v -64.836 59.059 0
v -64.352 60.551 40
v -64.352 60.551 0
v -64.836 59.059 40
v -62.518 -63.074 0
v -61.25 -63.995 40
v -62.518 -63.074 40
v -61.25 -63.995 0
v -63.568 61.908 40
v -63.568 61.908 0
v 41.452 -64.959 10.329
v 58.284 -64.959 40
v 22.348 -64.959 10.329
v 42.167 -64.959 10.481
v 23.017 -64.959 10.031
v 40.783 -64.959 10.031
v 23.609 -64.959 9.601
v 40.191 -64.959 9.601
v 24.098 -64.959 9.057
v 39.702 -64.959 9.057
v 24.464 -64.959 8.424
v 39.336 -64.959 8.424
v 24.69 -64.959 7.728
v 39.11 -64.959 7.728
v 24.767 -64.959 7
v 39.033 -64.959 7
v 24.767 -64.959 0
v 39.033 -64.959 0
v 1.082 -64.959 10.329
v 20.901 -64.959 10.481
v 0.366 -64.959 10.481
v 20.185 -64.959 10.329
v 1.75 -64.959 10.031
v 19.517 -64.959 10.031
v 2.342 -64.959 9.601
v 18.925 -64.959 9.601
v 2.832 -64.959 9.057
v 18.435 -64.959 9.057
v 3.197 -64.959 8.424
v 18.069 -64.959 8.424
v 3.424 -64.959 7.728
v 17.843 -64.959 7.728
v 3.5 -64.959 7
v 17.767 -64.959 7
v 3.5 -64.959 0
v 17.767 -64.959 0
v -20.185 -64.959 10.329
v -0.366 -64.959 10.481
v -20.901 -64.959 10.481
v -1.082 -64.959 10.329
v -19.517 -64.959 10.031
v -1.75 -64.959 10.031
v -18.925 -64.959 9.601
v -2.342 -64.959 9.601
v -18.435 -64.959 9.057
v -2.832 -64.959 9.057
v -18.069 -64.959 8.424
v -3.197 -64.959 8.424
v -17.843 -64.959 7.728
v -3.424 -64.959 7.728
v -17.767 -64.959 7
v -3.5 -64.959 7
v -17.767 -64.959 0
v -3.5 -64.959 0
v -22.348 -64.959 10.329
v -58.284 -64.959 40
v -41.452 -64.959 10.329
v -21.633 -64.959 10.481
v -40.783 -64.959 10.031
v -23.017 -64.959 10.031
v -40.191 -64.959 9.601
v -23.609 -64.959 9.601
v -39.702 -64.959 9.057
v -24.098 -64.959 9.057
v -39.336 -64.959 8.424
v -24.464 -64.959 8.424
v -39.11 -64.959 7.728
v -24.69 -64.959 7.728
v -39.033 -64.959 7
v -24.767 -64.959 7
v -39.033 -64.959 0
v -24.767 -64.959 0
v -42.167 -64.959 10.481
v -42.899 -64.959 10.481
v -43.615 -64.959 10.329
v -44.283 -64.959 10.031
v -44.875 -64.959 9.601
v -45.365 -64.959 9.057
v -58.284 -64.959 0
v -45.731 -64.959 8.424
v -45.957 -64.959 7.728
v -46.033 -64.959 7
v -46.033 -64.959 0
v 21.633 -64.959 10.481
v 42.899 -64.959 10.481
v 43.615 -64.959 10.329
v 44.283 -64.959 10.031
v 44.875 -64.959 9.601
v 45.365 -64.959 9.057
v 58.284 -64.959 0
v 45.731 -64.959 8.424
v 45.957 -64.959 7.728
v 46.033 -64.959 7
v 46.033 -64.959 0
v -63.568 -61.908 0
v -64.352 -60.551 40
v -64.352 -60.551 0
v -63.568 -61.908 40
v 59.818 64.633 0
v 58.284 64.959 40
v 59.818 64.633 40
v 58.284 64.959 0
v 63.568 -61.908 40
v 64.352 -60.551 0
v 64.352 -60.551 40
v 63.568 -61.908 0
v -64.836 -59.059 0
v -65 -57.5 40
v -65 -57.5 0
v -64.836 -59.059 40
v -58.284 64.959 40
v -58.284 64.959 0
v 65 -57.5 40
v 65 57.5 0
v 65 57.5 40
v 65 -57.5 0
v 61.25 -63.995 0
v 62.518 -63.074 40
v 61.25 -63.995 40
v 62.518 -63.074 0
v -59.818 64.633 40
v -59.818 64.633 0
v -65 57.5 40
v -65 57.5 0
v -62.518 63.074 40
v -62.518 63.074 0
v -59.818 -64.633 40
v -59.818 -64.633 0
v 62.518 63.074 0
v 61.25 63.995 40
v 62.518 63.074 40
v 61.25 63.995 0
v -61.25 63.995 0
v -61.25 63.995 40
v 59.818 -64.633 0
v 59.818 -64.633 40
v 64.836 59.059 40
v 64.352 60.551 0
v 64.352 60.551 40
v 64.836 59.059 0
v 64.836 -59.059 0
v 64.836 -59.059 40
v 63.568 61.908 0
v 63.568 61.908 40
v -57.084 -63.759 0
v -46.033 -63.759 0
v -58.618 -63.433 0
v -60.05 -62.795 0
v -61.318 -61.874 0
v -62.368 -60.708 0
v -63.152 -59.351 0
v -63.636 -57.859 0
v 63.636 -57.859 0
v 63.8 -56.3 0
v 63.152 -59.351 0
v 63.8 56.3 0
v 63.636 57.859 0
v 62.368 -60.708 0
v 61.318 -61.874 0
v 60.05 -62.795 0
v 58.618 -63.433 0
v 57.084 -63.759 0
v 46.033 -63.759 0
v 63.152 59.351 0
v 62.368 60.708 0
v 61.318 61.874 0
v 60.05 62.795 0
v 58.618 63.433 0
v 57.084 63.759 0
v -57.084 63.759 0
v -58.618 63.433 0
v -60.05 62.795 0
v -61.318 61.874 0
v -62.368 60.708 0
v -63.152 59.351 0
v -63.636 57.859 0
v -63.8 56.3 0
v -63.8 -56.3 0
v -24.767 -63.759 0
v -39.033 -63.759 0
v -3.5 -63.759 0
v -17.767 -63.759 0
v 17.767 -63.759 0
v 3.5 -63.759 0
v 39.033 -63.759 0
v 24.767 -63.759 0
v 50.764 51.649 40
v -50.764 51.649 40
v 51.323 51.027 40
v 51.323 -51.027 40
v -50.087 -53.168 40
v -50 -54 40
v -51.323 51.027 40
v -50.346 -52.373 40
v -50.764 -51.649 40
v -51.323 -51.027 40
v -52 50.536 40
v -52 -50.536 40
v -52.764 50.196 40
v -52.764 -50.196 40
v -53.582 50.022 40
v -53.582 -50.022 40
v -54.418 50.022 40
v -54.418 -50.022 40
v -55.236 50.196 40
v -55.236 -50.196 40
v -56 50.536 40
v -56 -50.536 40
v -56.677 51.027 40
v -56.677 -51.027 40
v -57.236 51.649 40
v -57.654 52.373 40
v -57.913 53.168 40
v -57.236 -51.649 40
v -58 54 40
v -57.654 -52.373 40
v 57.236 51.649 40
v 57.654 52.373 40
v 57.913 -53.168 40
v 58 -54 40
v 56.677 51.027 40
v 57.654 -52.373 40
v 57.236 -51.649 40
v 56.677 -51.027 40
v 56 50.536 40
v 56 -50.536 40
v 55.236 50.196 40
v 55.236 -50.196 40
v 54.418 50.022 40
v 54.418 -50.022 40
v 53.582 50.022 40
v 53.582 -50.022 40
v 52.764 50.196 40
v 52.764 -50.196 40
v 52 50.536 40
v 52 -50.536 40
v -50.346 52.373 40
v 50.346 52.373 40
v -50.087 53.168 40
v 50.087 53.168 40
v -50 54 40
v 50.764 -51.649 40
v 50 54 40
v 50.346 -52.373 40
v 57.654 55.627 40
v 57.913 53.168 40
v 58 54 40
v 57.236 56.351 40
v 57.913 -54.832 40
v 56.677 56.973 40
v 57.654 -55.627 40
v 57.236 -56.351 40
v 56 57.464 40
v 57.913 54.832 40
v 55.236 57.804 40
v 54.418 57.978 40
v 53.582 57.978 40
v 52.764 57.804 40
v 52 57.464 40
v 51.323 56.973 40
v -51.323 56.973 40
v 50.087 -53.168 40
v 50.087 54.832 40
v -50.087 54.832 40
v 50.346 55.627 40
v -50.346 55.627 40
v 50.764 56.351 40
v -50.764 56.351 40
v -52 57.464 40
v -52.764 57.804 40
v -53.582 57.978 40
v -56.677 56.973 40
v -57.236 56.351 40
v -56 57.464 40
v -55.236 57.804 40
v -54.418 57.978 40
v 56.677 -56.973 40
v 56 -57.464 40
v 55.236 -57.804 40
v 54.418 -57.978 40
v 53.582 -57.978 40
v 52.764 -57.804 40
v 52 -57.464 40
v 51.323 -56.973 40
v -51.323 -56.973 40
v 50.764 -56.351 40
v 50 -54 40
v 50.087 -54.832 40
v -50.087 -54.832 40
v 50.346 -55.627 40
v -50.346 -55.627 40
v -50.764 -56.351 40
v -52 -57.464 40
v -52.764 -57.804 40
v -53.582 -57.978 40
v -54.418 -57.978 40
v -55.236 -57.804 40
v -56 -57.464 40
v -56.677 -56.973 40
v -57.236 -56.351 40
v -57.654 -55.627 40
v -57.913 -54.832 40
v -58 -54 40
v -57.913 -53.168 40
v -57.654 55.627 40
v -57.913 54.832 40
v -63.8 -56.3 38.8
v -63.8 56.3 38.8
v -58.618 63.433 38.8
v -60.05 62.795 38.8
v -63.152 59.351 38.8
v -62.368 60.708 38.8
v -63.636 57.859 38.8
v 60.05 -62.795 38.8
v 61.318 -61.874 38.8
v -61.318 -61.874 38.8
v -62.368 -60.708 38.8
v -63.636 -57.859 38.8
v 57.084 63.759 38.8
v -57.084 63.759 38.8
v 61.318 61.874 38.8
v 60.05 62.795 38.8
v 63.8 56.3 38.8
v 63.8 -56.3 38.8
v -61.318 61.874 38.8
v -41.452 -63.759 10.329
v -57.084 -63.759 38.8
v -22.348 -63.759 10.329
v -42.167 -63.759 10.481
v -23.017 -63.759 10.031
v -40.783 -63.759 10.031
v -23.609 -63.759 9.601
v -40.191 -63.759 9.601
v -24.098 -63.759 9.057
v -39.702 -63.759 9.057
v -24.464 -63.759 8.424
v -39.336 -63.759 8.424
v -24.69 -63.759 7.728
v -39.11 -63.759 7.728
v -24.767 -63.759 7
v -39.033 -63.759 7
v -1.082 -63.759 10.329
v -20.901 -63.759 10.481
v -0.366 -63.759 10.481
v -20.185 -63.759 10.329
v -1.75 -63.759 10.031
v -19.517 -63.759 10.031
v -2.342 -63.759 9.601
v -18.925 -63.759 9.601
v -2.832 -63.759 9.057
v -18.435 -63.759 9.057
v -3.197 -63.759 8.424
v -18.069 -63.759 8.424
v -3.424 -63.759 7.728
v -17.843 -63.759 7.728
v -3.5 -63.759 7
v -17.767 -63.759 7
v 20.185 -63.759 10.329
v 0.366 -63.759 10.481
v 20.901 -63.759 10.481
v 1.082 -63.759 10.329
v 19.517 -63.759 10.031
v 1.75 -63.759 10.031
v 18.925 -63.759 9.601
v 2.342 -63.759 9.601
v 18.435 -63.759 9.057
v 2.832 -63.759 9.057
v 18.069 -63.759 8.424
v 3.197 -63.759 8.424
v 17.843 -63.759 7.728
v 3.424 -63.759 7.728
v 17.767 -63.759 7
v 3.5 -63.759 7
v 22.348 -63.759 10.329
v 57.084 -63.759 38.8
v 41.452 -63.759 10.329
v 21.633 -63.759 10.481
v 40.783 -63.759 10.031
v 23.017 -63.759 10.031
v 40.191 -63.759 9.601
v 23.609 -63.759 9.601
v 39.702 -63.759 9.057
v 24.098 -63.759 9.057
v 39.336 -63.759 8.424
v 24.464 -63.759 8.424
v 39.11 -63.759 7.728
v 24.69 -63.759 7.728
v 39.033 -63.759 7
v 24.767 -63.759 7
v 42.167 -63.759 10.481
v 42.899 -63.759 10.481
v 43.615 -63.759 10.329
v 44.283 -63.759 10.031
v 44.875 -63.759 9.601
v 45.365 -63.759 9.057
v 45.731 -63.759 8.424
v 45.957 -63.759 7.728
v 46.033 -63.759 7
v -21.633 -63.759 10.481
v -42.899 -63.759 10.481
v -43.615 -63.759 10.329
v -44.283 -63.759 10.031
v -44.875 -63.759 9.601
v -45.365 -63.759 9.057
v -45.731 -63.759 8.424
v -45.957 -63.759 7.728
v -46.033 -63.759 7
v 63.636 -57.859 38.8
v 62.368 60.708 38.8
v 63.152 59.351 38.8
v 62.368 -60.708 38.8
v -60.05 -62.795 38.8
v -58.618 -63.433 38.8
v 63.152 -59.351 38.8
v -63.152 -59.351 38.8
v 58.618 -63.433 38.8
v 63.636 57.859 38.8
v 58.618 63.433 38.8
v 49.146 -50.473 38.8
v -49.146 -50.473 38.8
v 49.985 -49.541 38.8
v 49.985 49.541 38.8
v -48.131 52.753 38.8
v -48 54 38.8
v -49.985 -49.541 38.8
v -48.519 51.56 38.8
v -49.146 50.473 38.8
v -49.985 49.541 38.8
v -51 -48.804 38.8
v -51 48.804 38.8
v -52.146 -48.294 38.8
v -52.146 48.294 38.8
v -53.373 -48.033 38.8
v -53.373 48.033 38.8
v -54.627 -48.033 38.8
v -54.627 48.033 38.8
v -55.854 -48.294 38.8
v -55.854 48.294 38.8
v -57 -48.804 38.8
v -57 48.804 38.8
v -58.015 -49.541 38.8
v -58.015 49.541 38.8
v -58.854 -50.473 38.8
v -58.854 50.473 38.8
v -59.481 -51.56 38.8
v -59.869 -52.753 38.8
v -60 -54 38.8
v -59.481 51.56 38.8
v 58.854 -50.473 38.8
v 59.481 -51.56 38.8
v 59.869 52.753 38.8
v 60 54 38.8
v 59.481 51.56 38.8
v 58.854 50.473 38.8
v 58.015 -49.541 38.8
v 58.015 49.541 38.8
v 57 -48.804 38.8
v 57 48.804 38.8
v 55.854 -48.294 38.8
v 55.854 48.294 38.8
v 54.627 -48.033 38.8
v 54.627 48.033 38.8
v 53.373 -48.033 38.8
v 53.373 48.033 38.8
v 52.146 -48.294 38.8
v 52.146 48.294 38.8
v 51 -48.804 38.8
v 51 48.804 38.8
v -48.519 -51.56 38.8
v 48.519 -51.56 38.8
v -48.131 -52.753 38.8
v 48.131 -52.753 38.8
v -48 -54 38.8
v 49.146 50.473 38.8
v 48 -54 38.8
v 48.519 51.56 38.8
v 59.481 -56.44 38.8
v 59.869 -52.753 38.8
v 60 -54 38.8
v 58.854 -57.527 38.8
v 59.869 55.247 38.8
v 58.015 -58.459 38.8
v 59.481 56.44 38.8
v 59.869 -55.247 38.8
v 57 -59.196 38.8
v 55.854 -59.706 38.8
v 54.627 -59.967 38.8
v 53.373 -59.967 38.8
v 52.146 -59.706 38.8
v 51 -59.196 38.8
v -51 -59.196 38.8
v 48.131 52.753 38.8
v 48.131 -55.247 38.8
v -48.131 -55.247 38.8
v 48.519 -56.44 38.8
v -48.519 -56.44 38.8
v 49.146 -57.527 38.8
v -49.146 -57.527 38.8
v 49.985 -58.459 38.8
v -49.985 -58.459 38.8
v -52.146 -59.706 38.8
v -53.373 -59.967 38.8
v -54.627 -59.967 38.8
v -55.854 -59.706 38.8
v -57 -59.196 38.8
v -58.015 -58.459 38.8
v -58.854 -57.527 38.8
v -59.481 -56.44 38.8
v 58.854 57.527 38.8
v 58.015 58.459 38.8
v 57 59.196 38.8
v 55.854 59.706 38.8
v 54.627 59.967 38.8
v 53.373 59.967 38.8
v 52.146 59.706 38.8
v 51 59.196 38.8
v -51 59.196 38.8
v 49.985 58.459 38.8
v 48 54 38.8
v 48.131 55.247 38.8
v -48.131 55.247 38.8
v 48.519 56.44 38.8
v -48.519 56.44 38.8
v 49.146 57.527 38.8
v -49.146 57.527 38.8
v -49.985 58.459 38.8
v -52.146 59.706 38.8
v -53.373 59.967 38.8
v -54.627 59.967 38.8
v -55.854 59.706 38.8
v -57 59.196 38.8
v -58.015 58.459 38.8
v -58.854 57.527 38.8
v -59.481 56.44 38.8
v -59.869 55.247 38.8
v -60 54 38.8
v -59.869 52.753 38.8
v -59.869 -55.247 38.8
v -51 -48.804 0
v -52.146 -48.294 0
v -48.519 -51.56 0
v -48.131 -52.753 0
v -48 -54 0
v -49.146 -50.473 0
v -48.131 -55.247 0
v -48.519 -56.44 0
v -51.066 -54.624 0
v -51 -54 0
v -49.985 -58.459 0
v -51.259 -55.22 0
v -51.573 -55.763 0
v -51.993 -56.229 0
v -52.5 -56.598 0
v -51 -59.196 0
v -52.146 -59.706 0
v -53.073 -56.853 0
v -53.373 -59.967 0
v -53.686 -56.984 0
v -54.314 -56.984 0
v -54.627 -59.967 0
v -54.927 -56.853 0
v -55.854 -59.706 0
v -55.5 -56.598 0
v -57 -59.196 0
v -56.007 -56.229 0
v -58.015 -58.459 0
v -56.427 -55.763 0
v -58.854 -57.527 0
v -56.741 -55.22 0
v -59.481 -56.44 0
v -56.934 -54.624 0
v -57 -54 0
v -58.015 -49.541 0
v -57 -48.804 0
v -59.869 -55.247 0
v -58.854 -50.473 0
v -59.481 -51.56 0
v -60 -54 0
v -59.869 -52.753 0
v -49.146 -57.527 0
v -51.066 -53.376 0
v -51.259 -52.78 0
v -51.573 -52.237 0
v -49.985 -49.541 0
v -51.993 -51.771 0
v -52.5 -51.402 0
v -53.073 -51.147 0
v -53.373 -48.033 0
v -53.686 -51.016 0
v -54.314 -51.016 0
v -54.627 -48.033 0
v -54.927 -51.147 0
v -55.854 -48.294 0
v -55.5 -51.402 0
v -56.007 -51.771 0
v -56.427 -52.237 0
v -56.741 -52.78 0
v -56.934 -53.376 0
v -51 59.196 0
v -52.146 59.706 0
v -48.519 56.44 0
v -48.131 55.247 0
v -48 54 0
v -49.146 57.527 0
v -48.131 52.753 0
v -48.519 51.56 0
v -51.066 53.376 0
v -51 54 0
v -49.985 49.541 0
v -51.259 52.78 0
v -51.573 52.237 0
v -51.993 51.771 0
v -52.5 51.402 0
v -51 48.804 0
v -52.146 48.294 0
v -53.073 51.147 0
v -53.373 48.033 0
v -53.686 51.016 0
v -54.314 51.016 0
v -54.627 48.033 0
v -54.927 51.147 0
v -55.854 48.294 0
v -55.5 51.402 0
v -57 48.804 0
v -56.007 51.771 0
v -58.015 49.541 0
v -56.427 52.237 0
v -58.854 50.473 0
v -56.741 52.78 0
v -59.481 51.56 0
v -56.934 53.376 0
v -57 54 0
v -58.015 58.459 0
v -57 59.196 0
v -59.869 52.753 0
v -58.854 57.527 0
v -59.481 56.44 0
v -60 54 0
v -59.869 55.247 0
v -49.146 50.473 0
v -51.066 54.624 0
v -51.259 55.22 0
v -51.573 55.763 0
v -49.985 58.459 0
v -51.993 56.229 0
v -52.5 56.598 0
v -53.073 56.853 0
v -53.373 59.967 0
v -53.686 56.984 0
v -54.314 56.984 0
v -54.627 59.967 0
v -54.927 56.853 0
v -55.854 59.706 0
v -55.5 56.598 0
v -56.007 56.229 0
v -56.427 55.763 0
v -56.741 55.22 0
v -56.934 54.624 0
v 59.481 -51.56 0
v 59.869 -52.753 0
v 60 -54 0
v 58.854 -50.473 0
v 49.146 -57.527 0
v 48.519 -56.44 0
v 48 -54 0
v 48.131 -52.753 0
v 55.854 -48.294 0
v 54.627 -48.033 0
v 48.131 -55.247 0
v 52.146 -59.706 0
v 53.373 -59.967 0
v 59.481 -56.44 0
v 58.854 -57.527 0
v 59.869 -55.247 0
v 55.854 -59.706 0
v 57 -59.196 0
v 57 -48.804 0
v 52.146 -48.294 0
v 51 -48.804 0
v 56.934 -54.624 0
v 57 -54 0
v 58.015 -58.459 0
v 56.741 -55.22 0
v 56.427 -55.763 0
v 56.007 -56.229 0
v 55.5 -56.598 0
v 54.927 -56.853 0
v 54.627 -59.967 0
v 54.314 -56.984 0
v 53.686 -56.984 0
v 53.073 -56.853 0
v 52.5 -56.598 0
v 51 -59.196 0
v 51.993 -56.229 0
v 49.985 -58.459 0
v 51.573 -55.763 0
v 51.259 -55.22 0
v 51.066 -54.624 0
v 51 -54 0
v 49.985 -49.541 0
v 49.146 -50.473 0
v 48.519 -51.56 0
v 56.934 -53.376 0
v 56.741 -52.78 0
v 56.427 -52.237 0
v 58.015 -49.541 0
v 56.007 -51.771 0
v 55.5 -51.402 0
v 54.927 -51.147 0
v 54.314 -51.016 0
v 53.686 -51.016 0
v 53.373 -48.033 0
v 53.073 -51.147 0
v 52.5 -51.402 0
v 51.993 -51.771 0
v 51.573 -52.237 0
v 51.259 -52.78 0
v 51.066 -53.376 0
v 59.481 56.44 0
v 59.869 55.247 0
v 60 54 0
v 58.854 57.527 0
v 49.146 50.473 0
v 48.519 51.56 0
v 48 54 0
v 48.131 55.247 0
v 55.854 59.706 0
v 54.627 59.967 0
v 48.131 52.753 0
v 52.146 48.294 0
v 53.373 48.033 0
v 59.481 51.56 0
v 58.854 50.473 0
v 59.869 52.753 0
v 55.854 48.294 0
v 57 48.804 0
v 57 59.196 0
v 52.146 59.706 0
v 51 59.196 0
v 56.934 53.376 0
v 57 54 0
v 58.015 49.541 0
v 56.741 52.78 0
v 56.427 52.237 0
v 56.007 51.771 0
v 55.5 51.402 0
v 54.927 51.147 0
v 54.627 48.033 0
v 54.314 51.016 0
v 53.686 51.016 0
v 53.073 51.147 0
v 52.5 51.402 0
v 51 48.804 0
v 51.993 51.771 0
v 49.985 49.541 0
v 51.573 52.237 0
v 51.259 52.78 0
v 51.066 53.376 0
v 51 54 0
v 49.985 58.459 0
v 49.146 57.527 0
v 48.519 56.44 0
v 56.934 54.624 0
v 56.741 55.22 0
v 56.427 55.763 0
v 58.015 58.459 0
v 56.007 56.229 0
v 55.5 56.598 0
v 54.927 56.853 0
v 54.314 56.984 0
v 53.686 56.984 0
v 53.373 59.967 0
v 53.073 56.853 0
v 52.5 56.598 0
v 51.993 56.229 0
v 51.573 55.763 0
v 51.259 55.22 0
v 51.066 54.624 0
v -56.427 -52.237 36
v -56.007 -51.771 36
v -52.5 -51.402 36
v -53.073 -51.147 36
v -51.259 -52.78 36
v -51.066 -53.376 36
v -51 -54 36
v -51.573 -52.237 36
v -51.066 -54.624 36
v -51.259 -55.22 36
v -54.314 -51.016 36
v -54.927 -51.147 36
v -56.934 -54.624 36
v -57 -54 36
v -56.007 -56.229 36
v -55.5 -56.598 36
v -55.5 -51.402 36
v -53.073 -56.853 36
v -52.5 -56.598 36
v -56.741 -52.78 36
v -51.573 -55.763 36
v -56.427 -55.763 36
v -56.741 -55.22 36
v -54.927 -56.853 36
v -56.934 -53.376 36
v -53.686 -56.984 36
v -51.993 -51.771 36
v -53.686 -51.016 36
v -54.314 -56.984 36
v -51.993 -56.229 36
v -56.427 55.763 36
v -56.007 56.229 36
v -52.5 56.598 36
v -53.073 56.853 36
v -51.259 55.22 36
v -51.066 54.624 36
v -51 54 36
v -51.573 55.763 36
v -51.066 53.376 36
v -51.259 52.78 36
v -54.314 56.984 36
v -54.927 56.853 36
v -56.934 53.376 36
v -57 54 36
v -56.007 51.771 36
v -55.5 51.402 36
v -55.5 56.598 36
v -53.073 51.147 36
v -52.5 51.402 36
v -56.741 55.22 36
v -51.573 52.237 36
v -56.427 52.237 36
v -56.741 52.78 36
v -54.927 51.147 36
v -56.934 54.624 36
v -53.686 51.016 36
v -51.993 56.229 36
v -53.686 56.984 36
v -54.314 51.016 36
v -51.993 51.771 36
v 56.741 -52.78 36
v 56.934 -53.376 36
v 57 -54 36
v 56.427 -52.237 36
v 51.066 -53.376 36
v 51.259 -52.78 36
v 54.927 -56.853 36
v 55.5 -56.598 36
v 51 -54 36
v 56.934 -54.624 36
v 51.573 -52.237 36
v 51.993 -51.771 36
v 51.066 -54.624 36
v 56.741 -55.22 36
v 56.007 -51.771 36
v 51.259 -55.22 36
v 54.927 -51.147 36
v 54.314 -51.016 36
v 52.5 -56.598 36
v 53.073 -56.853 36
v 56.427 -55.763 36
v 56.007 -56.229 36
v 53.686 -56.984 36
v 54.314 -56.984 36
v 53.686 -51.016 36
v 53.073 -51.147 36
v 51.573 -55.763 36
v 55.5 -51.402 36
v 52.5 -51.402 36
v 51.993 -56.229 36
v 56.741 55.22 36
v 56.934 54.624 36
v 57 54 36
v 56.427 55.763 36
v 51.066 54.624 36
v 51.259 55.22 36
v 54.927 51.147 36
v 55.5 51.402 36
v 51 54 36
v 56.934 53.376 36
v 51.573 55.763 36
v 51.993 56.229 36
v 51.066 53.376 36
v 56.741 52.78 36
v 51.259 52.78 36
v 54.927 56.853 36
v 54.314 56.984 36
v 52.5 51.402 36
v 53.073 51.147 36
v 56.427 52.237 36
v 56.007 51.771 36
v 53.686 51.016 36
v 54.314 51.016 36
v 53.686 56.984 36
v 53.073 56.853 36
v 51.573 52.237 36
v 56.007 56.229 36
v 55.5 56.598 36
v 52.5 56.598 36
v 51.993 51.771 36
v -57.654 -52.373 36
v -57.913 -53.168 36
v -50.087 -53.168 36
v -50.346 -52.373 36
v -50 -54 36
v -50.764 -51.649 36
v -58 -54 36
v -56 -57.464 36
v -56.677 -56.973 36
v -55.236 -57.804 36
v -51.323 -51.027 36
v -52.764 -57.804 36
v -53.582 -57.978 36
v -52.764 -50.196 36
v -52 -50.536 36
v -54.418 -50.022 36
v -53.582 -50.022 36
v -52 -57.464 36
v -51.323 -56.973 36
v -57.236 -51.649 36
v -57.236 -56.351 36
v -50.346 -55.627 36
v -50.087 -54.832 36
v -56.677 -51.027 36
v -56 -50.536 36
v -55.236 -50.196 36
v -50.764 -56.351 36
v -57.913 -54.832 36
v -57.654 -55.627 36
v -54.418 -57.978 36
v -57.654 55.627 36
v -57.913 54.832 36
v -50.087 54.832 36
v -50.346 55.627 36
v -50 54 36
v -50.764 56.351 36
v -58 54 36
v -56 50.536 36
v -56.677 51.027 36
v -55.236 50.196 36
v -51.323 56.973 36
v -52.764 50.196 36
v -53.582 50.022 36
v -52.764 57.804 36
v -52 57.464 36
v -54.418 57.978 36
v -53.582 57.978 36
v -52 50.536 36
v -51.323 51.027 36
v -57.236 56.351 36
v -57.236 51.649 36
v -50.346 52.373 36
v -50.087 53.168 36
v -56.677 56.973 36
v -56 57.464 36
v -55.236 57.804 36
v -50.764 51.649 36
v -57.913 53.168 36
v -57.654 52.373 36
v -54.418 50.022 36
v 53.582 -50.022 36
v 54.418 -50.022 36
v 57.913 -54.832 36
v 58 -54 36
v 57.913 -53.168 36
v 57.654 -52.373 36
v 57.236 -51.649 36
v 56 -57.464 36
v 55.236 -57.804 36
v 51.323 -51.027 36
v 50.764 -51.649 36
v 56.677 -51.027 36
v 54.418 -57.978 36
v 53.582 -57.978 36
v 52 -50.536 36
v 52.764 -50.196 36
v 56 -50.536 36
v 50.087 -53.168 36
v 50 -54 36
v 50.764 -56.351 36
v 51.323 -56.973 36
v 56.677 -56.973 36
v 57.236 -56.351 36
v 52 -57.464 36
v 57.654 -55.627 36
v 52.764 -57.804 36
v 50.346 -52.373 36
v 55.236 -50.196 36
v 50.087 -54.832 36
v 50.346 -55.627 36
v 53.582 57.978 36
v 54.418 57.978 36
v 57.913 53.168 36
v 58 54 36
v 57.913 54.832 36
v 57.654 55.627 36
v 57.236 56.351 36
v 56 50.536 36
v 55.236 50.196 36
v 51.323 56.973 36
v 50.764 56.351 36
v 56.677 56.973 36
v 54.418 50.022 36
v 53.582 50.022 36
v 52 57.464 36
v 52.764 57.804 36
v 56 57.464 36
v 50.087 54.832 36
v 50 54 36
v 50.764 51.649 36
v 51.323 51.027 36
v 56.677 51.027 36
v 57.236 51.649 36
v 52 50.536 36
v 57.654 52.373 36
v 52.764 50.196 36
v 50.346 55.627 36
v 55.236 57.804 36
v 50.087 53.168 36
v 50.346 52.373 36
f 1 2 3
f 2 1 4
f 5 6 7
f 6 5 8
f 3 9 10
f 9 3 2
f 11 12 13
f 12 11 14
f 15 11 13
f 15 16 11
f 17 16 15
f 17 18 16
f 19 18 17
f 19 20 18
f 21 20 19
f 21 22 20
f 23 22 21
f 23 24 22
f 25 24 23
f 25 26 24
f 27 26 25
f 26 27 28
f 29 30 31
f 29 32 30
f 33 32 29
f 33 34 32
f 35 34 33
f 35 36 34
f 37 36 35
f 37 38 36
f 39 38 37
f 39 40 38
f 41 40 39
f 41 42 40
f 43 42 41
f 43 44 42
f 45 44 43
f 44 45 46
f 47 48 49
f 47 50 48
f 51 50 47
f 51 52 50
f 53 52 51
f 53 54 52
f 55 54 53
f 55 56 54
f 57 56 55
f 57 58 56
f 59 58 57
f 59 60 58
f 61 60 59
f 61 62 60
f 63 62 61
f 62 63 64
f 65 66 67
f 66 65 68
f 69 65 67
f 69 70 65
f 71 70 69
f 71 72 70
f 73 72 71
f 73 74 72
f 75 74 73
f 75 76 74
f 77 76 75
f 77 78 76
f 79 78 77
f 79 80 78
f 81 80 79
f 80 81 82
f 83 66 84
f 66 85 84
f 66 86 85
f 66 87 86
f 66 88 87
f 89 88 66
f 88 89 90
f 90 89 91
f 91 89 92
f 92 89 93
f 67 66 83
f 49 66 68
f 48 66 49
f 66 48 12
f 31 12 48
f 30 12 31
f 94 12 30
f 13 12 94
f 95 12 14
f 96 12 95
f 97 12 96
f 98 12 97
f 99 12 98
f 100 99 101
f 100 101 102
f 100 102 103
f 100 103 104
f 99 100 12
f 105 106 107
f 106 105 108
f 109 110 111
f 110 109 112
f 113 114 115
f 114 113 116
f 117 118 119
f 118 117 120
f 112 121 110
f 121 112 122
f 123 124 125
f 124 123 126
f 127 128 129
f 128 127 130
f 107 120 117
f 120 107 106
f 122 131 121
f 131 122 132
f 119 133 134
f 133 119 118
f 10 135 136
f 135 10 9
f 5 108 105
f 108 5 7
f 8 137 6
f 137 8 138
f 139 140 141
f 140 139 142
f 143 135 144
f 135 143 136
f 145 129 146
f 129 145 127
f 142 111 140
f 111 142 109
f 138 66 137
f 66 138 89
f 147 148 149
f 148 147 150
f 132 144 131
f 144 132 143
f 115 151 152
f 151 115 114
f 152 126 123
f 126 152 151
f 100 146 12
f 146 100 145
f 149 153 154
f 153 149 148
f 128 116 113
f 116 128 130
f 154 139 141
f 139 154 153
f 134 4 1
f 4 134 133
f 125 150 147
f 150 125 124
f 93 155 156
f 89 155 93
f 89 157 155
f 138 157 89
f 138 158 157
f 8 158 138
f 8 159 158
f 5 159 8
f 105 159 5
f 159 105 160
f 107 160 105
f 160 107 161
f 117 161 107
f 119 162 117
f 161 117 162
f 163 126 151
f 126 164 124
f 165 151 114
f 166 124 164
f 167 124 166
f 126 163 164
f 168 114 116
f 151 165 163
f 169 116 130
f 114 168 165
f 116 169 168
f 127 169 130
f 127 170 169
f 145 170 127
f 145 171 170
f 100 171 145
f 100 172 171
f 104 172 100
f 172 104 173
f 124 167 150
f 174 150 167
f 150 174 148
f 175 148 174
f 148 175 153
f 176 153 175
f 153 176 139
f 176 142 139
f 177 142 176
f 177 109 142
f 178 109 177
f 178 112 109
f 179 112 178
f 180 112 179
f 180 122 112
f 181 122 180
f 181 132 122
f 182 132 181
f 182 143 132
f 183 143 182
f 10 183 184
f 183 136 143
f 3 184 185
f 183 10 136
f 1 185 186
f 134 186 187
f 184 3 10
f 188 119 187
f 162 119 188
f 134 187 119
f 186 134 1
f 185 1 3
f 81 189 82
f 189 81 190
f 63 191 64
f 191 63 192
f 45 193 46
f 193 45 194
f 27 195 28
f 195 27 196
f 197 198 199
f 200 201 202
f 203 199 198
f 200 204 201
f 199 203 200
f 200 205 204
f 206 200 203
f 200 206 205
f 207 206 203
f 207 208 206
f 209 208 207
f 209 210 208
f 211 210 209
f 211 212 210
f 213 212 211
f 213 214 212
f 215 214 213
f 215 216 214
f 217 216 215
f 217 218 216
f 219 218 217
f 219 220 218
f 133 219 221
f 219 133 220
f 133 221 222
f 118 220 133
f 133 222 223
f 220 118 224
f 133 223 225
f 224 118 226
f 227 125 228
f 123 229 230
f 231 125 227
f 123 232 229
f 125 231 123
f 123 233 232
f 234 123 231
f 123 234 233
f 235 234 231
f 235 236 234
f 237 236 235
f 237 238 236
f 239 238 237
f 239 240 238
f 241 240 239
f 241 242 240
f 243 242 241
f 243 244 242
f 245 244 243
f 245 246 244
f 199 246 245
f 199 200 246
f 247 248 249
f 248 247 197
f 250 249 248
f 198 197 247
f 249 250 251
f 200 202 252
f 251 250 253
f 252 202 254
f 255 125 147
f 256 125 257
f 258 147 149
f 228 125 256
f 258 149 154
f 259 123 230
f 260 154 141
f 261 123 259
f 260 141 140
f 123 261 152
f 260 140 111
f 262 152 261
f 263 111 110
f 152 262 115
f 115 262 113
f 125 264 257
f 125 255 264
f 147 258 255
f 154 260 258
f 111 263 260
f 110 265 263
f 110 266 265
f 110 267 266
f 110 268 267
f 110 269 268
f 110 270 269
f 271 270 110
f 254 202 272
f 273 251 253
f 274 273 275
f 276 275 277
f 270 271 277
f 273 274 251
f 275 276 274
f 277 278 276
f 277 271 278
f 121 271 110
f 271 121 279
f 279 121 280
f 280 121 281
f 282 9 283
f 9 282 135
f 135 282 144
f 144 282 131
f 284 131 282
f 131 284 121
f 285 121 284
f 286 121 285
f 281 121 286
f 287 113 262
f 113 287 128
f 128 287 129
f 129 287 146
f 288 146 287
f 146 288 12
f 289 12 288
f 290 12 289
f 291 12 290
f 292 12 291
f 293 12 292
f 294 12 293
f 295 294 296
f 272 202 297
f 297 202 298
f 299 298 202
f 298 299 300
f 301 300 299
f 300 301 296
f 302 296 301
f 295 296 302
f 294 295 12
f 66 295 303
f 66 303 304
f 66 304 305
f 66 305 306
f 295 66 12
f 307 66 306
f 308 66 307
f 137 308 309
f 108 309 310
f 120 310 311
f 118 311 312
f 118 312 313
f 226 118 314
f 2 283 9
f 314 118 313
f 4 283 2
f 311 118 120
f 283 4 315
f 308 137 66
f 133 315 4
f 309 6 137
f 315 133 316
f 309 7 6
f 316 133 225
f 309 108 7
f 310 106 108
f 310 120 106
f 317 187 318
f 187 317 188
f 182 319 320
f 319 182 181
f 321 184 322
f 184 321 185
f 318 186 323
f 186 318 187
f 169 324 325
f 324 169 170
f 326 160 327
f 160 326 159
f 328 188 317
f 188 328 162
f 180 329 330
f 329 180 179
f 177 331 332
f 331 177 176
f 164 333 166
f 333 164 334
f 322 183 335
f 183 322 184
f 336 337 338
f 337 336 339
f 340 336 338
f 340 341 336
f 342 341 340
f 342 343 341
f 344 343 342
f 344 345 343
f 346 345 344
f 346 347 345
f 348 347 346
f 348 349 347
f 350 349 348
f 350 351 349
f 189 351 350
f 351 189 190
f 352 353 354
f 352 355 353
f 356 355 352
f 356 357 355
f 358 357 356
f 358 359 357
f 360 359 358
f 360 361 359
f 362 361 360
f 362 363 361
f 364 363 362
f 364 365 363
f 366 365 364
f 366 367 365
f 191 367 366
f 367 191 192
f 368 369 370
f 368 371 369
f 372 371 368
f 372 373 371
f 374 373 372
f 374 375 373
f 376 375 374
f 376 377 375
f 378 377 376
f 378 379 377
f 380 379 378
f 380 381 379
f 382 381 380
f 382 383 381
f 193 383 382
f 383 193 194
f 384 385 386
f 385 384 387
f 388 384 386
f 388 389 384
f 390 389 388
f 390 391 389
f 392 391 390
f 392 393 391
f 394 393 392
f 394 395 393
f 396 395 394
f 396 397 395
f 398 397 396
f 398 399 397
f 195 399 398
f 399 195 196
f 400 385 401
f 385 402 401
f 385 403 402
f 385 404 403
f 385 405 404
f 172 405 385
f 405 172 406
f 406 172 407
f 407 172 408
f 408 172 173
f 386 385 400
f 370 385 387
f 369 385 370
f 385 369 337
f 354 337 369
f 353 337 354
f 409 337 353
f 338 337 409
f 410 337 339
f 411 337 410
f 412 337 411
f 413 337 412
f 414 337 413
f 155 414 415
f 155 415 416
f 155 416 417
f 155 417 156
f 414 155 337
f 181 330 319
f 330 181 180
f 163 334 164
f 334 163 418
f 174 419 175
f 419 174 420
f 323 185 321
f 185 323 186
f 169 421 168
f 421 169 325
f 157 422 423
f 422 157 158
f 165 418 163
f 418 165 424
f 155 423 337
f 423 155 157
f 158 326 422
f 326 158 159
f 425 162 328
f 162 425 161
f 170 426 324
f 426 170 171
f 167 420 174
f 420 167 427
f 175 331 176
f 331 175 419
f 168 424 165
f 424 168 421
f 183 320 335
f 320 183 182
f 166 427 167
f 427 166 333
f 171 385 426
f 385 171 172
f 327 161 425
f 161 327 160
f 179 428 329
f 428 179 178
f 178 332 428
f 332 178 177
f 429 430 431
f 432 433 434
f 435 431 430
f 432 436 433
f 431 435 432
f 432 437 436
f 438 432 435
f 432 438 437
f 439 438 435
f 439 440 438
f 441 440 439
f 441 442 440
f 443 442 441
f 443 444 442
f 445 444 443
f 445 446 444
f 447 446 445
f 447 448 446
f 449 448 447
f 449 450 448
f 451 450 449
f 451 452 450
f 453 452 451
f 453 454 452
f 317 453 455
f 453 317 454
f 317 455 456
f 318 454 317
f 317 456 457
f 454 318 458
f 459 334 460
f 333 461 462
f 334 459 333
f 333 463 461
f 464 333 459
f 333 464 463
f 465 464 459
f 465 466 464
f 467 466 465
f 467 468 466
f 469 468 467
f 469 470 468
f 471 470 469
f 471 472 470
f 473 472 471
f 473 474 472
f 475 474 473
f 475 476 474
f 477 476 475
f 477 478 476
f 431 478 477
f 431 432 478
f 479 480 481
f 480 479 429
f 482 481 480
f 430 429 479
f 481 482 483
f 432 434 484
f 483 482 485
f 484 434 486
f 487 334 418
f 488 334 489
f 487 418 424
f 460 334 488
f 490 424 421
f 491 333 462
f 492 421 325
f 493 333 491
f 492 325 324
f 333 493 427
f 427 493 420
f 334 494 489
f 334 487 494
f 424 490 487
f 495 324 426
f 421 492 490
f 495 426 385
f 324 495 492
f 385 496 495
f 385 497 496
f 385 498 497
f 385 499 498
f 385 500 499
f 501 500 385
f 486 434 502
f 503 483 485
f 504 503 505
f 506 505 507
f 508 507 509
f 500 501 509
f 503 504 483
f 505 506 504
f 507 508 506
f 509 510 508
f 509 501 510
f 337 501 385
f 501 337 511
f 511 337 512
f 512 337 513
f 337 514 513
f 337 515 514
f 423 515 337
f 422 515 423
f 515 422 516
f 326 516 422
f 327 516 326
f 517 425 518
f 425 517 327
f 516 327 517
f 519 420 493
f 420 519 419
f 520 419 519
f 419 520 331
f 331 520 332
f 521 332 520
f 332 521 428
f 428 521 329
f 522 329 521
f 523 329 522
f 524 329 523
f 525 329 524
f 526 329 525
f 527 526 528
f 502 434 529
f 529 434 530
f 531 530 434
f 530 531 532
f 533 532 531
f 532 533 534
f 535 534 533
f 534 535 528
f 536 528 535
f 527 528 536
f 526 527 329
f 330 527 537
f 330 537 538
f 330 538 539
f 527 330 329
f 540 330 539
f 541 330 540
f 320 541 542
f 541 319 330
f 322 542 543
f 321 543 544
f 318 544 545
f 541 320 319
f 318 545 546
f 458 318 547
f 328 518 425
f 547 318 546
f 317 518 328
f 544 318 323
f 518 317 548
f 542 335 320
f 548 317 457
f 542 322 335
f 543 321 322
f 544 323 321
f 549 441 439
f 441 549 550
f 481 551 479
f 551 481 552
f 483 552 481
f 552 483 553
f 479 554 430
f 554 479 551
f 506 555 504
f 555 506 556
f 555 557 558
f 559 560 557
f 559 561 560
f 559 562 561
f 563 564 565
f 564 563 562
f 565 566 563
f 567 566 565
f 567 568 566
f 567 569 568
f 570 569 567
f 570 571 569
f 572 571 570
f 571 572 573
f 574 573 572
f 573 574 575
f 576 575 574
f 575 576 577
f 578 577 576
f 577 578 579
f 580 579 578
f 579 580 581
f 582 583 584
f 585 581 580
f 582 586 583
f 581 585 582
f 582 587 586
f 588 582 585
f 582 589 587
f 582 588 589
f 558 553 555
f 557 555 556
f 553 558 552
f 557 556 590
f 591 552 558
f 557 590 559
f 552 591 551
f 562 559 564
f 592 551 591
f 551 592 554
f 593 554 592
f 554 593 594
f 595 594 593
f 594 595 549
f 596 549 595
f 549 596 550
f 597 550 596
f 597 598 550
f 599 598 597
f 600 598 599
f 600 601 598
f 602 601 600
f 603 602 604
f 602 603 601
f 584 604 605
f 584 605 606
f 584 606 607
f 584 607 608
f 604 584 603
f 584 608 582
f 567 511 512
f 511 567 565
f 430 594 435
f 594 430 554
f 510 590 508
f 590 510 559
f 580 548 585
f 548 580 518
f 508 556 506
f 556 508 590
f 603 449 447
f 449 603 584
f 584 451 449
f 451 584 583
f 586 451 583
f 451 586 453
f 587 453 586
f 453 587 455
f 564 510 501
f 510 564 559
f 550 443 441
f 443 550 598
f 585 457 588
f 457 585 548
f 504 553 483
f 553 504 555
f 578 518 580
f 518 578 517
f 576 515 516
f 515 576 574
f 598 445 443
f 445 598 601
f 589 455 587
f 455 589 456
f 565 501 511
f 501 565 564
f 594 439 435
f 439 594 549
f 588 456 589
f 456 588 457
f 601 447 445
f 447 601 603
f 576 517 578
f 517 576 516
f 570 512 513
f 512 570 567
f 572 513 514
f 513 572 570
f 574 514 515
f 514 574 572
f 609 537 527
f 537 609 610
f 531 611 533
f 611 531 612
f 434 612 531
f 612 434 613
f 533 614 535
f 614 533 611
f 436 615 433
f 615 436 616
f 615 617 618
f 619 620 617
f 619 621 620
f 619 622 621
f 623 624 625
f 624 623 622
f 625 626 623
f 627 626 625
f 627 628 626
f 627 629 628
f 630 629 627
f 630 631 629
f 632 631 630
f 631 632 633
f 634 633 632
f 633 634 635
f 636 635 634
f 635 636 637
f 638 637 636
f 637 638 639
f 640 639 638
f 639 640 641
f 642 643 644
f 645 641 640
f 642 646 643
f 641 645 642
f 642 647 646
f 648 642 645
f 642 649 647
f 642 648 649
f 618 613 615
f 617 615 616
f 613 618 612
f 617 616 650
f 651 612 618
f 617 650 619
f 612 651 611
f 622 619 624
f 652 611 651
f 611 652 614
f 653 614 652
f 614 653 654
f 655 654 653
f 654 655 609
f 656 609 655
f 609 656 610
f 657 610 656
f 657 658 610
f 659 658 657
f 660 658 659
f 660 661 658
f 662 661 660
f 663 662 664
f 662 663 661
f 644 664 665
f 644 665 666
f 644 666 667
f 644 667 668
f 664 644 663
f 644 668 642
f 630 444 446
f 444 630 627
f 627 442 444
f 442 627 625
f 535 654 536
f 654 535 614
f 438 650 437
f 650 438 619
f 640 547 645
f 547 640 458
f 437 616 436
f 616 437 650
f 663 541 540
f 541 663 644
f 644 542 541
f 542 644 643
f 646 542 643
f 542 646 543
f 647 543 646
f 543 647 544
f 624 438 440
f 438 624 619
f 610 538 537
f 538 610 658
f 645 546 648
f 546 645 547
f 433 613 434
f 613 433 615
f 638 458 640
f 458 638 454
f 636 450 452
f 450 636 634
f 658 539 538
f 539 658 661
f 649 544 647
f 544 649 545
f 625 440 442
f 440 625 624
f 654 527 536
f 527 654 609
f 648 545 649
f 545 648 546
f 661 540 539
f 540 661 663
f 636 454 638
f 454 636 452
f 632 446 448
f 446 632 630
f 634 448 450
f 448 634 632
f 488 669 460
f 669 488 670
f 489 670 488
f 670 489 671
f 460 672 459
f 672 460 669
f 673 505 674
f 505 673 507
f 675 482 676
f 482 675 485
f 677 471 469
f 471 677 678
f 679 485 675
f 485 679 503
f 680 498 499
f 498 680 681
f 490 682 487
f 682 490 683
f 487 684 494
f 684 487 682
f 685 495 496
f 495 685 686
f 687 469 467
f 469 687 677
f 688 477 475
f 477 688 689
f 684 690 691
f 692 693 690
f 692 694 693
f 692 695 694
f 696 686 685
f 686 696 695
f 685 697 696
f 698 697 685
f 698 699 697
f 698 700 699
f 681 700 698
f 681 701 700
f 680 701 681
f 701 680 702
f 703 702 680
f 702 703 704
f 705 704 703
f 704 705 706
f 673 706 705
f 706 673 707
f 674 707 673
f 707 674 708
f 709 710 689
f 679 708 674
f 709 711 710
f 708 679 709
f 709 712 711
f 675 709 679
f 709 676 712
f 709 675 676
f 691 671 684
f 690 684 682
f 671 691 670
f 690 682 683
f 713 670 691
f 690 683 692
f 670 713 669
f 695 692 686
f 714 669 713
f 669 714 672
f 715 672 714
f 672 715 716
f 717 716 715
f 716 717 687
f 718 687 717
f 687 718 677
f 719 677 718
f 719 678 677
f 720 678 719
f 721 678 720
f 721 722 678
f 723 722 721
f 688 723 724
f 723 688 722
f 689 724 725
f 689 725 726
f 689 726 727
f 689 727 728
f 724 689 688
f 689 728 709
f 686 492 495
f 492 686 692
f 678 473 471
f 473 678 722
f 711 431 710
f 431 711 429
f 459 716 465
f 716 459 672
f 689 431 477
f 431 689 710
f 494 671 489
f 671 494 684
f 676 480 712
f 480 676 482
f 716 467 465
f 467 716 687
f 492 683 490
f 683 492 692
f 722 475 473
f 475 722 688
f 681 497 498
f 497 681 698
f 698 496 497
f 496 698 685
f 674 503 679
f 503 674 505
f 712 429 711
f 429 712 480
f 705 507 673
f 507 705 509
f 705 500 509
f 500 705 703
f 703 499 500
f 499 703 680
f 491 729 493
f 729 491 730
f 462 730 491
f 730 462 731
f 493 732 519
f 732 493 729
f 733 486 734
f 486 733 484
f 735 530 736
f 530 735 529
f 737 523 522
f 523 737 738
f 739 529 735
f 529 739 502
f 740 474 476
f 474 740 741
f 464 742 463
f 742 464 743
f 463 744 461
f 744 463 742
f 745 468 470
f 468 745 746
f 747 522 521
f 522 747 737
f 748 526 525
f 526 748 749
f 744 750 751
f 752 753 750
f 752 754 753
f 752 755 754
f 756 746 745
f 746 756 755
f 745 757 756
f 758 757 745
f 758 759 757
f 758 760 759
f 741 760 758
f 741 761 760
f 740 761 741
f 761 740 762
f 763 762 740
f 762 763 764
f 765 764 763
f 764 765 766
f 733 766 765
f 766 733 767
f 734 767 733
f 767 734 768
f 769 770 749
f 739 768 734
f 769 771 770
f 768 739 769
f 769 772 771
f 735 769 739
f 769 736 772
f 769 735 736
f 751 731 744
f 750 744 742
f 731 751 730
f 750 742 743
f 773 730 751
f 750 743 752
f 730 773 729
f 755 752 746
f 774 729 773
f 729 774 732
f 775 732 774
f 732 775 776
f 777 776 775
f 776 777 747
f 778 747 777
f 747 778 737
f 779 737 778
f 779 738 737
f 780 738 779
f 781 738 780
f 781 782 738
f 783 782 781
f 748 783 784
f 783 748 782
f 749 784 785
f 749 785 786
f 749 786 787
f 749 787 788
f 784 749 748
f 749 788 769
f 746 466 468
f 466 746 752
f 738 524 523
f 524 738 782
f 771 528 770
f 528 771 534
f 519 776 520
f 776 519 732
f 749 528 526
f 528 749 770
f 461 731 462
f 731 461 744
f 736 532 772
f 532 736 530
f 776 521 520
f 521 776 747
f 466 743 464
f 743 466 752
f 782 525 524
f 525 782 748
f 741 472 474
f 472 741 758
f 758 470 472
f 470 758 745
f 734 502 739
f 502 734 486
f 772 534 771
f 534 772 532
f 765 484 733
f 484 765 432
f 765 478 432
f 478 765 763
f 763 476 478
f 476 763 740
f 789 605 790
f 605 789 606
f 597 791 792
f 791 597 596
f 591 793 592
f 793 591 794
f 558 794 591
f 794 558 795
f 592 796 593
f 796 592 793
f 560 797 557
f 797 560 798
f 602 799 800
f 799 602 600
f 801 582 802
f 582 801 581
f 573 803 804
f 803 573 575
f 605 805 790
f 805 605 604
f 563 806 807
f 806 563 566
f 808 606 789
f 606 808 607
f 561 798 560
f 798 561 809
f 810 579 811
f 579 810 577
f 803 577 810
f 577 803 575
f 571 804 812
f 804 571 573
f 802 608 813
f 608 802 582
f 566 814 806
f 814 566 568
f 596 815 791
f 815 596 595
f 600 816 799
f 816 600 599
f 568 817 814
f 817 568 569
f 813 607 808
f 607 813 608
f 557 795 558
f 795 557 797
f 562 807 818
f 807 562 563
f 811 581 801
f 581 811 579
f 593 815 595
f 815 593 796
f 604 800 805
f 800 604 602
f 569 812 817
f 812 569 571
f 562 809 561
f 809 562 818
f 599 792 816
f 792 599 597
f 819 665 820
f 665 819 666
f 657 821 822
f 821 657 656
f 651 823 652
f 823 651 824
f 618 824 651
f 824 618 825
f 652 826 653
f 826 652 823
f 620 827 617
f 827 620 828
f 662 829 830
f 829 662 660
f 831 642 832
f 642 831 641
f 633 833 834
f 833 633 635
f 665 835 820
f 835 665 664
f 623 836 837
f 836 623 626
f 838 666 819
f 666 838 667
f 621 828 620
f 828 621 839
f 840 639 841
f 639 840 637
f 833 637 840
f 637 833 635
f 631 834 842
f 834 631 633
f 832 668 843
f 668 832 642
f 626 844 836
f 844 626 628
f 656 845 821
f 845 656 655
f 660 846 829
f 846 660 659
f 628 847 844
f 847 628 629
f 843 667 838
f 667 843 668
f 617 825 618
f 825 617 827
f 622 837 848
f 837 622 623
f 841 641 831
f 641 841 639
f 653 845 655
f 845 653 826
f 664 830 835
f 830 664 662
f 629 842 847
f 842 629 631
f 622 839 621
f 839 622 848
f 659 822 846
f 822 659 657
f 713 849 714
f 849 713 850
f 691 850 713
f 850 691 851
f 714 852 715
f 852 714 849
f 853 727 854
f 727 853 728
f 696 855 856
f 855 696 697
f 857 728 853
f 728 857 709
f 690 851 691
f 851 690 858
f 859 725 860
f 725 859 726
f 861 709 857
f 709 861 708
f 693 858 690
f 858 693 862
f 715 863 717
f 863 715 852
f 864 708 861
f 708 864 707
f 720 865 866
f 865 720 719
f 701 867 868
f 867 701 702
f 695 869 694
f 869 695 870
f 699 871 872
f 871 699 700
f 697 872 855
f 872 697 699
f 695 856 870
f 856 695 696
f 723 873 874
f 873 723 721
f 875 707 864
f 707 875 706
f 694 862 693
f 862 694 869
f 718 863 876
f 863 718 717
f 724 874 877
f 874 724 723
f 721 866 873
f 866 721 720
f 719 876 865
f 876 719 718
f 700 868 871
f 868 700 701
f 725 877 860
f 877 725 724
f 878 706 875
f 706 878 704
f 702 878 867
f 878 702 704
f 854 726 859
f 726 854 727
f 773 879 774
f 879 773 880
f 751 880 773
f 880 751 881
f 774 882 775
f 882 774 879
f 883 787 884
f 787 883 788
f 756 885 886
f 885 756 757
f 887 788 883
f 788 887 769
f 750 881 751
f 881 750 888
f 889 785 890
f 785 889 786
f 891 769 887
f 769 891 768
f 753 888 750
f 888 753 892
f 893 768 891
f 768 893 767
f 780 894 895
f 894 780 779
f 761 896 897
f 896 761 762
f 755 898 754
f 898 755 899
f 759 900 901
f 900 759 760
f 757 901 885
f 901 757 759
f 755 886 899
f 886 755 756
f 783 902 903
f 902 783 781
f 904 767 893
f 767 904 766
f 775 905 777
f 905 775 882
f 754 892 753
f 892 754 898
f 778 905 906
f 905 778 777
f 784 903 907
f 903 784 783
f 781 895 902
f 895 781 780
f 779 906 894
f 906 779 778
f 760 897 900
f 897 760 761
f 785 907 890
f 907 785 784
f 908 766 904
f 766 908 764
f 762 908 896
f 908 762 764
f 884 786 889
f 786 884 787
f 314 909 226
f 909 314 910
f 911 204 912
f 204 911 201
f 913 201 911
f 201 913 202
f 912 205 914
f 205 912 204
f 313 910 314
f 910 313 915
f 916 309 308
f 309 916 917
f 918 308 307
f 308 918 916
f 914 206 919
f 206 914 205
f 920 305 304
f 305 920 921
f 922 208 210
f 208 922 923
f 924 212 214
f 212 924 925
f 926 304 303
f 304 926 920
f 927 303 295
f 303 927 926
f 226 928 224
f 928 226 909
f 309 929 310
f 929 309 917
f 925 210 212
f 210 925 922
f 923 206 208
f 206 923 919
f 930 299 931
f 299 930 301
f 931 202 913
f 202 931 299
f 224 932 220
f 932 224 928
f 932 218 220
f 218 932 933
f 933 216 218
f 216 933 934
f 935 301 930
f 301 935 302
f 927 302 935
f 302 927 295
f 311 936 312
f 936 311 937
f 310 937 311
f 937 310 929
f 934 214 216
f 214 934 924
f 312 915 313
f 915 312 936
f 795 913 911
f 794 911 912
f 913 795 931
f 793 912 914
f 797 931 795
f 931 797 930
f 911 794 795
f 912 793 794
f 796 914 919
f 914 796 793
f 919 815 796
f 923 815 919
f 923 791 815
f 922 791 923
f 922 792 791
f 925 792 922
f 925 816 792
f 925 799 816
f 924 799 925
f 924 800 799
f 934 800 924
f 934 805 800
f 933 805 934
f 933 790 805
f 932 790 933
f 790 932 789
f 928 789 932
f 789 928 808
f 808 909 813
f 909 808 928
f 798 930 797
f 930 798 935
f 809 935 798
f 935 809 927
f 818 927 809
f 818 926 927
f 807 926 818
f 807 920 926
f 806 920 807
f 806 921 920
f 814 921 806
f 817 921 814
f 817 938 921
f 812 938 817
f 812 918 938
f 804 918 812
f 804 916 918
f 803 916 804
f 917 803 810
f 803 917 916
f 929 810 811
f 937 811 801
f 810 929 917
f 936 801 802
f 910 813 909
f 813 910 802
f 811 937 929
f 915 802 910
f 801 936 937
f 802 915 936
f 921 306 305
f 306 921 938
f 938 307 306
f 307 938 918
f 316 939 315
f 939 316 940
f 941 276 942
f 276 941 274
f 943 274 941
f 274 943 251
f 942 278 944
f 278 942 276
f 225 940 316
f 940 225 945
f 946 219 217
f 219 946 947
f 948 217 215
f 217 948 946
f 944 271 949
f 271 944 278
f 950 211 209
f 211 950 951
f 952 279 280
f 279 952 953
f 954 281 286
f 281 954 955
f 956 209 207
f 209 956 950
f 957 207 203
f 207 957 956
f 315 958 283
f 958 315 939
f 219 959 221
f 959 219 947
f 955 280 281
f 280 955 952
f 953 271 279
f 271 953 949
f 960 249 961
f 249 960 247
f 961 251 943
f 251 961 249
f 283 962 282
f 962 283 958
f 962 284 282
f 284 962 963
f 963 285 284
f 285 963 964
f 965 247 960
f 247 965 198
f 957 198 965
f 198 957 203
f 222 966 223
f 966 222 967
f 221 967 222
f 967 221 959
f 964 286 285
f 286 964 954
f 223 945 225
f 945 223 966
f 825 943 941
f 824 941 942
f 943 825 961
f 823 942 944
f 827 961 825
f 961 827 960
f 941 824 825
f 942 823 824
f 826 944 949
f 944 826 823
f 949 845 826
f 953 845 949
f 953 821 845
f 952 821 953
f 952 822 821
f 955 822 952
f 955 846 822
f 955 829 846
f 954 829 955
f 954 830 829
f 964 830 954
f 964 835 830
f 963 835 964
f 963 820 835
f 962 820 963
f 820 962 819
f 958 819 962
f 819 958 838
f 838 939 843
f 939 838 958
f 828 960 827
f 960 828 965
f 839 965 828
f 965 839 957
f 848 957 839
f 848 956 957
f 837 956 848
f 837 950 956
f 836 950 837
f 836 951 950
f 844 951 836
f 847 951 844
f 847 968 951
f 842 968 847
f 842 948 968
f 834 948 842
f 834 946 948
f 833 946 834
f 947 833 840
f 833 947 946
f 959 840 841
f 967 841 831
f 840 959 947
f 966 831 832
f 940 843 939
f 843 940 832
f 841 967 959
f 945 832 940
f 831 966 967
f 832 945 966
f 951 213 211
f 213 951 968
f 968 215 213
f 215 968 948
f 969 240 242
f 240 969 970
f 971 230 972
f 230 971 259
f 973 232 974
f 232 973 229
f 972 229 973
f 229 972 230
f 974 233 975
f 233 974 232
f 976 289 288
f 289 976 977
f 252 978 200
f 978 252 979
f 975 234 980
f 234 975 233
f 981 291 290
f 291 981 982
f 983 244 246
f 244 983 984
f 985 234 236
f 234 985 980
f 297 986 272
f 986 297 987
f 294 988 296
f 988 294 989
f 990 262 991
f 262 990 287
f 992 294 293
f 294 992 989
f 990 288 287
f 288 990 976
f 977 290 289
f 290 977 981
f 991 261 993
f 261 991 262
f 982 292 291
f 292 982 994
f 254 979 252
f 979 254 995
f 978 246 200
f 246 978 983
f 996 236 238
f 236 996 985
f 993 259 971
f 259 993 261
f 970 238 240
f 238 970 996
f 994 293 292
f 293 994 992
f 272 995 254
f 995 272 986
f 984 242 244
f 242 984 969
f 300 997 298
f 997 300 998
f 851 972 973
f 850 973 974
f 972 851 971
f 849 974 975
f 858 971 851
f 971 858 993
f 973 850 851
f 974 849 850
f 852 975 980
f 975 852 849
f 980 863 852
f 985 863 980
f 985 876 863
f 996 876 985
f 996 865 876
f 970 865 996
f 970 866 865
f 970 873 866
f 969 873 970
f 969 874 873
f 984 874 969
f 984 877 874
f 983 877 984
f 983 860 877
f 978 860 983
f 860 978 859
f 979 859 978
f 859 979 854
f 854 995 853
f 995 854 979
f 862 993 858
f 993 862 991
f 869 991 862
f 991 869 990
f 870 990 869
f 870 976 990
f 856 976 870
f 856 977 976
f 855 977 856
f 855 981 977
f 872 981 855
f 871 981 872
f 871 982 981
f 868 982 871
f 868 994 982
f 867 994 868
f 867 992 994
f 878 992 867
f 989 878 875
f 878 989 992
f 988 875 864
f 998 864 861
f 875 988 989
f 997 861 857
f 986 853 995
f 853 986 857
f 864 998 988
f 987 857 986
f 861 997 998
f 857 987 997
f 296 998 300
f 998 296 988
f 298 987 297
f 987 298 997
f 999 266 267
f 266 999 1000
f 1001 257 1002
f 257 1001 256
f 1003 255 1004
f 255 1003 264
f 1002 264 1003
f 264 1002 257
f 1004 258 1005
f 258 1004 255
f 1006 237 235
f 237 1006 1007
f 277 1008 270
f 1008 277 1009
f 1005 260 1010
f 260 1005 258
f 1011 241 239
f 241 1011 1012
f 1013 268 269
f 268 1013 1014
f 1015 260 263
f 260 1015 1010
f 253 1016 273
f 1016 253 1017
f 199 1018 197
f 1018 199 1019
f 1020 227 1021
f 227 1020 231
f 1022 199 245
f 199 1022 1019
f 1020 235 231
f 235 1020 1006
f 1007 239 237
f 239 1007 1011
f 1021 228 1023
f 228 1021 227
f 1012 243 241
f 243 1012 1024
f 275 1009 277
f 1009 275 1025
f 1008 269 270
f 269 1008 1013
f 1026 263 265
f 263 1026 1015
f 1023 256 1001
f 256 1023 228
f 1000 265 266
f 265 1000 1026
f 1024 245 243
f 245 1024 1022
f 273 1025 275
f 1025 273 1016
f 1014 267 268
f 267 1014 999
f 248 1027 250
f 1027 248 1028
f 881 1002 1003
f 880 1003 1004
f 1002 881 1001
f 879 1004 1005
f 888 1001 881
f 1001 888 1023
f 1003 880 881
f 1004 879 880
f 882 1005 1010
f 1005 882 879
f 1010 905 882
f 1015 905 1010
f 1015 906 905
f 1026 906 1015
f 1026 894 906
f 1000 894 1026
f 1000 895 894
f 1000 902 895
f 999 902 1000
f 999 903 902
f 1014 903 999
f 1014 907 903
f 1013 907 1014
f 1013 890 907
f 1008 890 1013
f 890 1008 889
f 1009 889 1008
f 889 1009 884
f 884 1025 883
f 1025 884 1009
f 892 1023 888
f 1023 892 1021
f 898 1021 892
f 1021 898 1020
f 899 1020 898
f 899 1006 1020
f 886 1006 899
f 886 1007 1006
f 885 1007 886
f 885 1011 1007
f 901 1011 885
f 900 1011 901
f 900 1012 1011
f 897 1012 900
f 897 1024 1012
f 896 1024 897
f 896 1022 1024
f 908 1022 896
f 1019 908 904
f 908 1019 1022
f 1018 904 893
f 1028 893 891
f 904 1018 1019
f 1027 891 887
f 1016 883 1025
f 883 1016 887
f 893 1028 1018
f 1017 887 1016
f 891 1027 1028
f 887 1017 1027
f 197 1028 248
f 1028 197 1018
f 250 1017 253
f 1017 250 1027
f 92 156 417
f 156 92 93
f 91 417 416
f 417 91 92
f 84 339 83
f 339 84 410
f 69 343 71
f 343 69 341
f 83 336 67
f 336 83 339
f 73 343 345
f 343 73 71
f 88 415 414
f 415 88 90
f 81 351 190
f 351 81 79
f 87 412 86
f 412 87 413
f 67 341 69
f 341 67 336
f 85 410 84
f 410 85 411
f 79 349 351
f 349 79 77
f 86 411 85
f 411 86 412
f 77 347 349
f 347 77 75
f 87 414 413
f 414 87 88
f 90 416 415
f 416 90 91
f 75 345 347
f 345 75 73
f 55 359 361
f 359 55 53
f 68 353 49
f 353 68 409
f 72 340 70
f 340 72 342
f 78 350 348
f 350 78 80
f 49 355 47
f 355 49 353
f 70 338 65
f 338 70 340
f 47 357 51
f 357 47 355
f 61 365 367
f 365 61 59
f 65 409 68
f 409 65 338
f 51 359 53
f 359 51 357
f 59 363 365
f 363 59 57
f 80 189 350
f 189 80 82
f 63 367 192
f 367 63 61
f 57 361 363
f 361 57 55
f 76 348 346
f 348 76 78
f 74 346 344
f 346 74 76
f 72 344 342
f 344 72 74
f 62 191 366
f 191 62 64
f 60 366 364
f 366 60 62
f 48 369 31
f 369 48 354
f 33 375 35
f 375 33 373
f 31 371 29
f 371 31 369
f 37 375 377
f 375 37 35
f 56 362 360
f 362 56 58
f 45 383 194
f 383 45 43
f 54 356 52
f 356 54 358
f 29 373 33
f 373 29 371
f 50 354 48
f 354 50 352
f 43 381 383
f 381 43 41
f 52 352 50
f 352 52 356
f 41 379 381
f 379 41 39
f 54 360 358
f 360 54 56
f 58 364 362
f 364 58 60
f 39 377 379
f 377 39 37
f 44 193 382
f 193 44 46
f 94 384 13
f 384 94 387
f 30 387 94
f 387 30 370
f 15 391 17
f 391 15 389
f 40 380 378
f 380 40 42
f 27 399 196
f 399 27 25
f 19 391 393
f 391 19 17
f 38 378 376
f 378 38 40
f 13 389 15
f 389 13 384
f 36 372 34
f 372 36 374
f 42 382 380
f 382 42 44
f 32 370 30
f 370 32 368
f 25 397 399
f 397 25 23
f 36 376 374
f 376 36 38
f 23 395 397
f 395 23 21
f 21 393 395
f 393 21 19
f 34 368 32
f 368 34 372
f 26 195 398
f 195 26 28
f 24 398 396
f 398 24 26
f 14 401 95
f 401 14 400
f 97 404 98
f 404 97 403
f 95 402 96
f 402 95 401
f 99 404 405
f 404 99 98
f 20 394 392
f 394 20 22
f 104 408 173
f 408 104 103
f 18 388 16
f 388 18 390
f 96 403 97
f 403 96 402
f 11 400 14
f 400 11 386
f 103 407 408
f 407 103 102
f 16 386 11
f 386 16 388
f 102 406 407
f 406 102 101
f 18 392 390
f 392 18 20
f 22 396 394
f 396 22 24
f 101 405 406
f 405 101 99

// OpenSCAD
THICKNESS = 1.2;
WIDTH = 130 - 2 * THICKNESS;
HEIGHT = 40 - THICKNESS;
CORNER_DIA = 15;

MOUNTING_HOLE_SPACING = 120;
MOUNTING_HOLE_DIA = 6;
MOUNTING_HOLE_HEAD_DIA = 8;
MOUNTING_HOLE_HEAD_HEIGHT = 4;
MOUNTING_HOLE_PEG_DIA = 12;

PORT_DIA = 7;
PORTS = 5;
PORTS_LENGTH = 7;

$fn = 30;

module pegs(width, length, height, corner_dia) {
    for(i = [-1, 1]) {
        for(j = [-1, 1]) {
            translate([i * (width - corner_dia)/2, j * (length - corner_dia)/2, 0])
            cylinder(d = corner_dia, h = height);
        }
    }
}

module rounded_rect(width, length, height, corner_dia) {
    hull() {
        pegs(width, length, height, corner_dia);
    }
}

module ports() {
    for(i = [1:PORTS]) {
        hull() {
        translate([-WIDTH/2 + i * (WIDTH/(PORTS + 1)), 0, PORTS_LENGTH])
        rotate([90, 0, 0])
        cylinder(d = PORT_DIA, h = WIDTH);

        translate([-WIDTH/2 + i * (WIDTH/(PORTS + 1)), 0, -PORTS_LENGTH])
        rotate([90, 0, 0])
        cylinder(d = PORT_DIA, h = WIDTH);
        }
    }
}

difference() {
    union() {
        difference() {
            rounded_rect(WIDTH + 2 * THICKNESS, WIDTH + 2 * THICKNESS, HEIGHT + THICKNESS, CORNER_DIA);

            rounded_rect(WIDTH, WIDTH, HEIGHT, CORNER_DIA);
        }
        pegs(MOUNTING_HOLE_SPACING, MOUNTING_HOLE_SPACING, HEIGHT + THICKNESS, MOUNTING_HOLE_PEG_DIA);
    }

    delta = (MOUNTING_HOLE_PEG_DIA - MOUNTING_HOLE_DIA);
    pegs(MOUNTING_HOLE_SPACING - delta, MOUNTING_HOLE_SPACING - delta, HEIGHT + 2 * THICKNESS, MOUNTING_HOLE_DIA);

    head_delta = (MOUNTING_HOLE_PEG_DIA - MOUNTING_HOLE_HEAD_DIA);
    translate([0, 0, HEIGHT + THICKNESS - MOUNTING_HOLE_HEAD_HEIGHT])
    pegs(MOUNTING_HOLE_SPACING - head_delta, MOUNTING_HOLE_SPACING - head_delta, MOUNTING_HOLE_HEAD_HEIGHT, MOUNTING_HOLE_HEAD_DIA);

    ports();
}
